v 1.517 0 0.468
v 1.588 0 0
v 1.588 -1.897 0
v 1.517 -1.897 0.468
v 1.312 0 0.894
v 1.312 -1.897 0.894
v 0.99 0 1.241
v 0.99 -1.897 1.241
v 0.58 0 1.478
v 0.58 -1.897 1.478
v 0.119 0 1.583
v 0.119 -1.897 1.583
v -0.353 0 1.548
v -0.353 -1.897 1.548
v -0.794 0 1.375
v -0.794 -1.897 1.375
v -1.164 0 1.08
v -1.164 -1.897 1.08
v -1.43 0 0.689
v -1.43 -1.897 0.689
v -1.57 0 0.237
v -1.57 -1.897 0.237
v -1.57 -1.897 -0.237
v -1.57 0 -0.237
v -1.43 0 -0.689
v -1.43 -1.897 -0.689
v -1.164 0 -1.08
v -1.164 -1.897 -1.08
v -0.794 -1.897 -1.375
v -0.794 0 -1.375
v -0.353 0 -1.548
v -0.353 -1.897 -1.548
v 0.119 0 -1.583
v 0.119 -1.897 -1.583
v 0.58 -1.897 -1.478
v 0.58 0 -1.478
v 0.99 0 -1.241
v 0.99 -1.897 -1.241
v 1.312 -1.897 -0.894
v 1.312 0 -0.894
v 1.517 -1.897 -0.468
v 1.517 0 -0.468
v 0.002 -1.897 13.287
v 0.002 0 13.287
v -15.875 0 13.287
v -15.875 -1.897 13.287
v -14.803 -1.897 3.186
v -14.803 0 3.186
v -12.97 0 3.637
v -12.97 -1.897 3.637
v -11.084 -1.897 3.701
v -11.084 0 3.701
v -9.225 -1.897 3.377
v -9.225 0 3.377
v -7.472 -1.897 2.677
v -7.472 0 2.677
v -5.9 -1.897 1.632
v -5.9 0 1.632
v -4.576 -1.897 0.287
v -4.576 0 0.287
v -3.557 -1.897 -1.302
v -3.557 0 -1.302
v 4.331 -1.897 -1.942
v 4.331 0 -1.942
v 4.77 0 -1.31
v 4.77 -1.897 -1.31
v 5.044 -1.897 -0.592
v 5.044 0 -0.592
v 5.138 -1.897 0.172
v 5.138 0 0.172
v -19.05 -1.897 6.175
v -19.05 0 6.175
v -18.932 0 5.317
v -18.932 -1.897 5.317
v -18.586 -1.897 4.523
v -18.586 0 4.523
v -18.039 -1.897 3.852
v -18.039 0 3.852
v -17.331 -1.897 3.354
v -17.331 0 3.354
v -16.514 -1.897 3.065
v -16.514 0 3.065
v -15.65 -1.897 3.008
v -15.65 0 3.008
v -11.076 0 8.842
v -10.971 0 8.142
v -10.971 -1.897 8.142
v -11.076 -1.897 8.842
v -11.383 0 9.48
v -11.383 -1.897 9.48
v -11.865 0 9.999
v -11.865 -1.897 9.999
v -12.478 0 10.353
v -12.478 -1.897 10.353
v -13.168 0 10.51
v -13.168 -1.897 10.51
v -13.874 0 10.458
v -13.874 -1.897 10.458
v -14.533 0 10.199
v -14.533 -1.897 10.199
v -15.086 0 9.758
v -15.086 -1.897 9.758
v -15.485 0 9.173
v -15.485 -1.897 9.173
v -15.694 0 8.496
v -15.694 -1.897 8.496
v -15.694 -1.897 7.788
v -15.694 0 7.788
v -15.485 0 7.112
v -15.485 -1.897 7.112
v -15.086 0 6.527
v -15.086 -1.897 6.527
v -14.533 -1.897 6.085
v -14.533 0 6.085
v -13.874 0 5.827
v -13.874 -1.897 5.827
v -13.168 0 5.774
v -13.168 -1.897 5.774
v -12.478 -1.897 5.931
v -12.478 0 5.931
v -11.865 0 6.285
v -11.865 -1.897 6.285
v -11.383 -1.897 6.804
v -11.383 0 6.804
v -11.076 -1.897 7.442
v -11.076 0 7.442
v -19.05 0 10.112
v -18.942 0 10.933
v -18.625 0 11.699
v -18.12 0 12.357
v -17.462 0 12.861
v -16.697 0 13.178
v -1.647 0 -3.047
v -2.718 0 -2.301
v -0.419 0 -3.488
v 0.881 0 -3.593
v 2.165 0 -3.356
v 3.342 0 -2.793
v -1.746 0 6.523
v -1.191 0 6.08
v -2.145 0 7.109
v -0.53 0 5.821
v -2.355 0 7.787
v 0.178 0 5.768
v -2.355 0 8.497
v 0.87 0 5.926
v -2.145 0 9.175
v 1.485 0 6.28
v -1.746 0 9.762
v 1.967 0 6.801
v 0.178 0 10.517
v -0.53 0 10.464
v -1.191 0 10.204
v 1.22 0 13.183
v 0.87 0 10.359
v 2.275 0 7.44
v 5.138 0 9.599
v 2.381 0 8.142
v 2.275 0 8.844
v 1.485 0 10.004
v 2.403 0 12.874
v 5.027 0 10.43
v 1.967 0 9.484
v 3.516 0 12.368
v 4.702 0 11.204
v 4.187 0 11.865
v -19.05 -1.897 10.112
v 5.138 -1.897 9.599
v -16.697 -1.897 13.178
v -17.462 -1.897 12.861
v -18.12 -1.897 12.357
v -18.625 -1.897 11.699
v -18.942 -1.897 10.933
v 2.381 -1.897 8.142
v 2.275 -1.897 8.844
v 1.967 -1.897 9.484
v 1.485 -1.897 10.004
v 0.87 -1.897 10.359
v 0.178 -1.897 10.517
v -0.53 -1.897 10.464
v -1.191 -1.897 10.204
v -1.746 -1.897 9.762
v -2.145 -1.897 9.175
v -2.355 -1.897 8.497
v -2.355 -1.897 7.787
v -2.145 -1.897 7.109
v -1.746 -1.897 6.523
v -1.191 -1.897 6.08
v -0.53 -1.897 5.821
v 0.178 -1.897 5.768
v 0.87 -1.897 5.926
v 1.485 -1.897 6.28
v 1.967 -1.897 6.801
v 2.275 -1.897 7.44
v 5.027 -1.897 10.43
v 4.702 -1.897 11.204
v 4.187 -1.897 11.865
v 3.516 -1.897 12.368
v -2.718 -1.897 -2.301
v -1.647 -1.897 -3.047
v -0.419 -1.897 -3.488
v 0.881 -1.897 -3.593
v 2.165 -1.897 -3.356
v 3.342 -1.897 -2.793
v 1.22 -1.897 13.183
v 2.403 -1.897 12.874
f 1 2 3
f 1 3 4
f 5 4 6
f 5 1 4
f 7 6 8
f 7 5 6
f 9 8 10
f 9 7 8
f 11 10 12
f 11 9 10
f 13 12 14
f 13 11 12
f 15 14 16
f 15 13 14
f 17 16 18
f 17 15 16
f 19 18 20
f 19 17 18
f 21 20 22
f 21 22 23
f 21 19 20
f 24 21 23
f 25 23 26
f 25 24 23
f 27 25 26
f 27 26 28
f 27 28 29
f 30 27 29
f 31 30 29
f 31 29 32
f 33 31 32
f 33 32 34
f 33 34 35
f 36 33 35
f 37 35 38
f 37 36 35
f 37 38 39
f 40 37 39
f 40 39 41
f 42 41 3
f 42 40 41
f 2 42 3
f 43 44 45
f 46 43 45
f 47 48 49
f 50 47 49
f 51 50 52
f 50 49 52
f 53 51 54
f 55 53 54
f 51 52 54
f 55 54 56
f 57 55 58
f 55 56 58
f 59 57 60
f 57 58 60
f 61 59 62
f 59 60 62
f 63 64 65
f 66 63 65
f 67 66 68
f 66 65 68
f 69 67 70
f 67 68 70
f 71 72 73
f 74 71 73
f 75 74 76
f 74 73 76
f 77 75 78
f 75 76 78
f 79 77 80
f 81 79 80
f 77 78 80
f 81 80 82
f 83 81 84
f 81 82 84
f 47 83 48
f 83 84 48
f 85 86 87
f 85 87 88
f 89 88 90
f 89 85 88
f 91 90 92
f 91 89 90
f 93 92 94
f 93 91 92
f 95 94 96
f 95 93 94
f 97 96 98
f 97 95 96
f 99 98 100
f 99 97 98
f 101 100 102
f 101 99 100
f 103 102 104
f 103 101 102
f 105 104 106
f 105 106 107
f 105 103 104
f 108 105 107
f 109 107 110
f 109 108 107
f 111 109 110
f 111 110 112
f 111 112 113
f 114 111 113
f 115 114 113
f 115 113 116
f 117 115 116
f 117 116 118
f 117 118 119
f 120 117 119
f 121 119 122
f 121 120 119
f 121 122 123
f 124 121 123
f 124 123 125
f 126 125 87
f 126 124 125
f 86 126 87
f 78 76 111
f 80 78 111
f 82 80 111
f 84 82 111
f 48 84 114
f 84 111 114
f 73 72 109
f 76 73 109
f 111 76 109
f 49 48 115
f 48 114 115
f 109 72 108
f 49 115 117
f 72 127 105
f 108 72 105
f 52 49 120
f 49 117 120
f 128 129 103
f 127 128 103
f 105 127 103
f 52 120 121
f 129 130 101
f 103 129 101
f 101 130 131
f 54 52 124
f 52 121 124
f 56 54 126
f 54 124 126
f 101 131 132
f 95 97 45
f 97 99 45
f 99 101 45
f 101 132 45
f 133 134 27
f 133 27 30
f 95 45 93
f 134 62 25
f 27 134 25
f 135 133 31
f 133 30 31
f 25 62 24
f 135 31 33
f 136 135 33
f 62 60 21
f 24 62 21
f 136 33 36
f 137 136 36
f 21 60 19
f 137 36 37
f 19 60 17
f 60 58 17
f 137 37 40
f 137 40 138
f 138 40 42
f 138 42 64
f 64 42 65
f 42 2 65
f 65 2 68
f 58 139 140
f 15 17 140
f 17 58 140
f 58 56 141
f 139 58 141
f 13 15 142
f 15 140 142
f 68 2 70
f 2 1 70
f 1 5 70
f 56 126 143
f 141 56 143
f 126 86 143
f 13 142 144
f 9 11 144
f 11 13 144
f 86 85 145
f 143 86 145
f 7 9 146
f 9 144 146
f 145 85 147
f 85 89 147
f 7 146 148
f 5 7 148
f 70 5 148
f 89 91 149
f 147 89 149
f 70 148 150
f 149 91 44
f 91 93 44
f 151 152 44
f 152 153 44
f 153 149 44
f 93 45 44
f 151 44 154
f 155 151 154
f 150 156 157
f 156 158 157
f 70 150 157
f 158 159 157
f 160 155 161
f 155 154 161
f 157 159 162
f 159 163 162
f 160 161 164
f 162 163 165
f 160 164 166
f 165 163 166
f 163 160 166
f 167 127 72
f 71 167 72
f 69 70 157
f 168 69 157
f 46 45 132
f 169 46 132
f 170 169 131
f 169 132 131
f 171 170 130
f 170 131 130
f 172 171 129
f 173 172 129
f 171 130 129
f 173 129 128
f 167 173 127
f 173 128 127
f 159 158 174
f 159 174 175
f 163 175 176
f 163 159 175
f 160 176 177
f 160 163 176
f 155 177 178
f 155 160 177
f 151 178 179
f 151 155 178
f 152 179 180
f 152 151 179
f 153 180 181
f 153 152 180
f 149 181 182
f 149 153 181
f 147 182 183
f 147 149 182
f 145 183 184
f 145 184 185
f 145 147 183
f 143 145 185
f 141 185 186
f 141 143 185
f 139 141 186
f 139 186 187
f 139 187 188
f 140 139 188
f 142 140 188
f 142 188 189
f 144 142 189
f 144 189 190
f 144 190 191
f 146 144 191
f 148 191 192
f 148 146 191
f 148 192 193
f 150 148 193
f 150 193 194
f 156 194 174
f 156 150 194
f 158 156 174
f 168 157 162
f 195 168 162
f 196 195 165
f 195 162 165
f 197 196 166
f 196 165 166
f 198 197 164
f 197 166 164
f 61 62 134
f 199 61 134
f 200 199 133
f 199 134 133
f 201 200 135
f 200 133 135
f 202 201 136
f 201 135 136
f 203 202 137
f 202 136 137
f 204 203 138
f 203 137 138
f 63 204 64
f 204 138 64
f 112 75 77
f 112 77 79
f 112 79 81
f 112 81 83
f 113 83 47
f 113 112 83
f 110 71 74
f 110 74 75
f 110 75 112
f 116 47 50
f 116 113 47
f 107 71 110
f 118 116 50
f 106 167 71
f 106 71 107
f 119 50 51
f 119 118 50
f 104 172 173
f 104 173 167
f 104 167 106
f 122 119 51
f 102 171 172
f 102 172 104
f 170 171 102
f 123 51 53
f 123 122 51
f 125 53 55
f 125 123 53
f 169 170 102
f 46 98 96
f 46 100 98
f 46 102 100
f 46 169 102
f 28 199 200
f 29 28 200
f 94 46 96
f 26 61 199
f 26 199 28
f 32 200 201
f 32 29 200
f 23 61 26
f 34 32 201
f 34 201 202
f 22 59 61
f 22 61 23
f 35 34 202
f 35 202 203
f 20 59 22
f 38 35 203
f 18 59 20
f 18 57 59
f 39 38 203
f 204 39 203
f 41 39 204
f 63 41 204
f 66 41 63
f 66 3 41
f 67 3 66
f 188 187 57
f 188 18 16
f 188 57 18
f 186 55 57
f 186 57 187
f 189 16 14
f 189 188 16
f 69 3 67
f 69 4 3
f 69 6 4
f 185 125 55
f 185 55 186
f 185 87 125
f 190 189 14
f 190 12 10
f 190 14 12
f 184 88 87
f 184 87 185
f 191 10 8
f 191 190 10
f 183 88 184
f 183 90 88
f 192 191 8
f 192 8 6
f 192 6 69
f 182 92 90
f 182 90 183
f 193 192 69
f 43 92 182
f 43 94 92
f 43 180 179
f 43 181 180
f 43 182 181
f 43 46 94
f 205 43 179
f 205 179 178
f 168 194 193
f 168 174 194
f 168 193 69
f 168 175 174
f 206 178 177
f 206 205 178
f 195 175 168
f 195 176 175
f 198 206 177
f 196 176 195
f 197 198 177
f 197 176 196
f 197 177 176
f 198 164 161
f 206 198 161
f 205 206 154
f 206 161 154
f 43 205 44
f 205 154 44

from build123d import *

# Parameters (mm, degrees)
F0_R     = 1.5875
F0_R_2   = 2.3749
F0_R_3   = 2.38125
F1_DEPTH = 1.89738


with BuildPart() as f1:
    # F0 (on Front) → F1 (new body)
    with BuildSketch(Plane.XZ):
        with BuildLine():
            ThreePointArc((3.515968, 12.368282), (1.81795, 13.053273), (0.001909, 13.286659))
            Line((0.001909, 13.286659), (-15.875, 13.286659))
            ThreePointArc((-15.875, 13.286659), (-18.120064, 12.356723), (-19.05, 10.111659))
            Line((-19.05, 10.111659), (-19.05, 6.175039))
            ThreePointArc((-19.05, 6.175039), (-17.702166, 3.578486), (-14.803016, 3.186482))
            ThreePointArc((-14.803016, 3.186482), (-8.330226, 3.072112), (-3.557411, -1.30171))
            ThreePointArc((-3.557411, -1.30171), (0.227554, -3.583606), (4.331067, -1.942206))
            ThreePointArc((4.331067, -1.942206), (4.929075, -0.959296), (5.137535, 0.172193))
            Line((5.137535, 0.172193), (5.137535, 9.599262))
            ThreePointArc((5.137535, 9.599262), (4.702314, 11.203705), (3.515968, 12.368282))
        make_face()
        Circle(F0_R, mode=Mode.SUBTRACT)
        with Locations((-13.345532, 8.142169)):
            Circle(F0_R_2, mode=Mode.SUBTRACT)
        with Locations((0, 8.142169)):
            Circle(F0_R_3, mode=Mode.SUBTRACT)
    extrude(amount=F1_DEPTH)


solid = f1.part
